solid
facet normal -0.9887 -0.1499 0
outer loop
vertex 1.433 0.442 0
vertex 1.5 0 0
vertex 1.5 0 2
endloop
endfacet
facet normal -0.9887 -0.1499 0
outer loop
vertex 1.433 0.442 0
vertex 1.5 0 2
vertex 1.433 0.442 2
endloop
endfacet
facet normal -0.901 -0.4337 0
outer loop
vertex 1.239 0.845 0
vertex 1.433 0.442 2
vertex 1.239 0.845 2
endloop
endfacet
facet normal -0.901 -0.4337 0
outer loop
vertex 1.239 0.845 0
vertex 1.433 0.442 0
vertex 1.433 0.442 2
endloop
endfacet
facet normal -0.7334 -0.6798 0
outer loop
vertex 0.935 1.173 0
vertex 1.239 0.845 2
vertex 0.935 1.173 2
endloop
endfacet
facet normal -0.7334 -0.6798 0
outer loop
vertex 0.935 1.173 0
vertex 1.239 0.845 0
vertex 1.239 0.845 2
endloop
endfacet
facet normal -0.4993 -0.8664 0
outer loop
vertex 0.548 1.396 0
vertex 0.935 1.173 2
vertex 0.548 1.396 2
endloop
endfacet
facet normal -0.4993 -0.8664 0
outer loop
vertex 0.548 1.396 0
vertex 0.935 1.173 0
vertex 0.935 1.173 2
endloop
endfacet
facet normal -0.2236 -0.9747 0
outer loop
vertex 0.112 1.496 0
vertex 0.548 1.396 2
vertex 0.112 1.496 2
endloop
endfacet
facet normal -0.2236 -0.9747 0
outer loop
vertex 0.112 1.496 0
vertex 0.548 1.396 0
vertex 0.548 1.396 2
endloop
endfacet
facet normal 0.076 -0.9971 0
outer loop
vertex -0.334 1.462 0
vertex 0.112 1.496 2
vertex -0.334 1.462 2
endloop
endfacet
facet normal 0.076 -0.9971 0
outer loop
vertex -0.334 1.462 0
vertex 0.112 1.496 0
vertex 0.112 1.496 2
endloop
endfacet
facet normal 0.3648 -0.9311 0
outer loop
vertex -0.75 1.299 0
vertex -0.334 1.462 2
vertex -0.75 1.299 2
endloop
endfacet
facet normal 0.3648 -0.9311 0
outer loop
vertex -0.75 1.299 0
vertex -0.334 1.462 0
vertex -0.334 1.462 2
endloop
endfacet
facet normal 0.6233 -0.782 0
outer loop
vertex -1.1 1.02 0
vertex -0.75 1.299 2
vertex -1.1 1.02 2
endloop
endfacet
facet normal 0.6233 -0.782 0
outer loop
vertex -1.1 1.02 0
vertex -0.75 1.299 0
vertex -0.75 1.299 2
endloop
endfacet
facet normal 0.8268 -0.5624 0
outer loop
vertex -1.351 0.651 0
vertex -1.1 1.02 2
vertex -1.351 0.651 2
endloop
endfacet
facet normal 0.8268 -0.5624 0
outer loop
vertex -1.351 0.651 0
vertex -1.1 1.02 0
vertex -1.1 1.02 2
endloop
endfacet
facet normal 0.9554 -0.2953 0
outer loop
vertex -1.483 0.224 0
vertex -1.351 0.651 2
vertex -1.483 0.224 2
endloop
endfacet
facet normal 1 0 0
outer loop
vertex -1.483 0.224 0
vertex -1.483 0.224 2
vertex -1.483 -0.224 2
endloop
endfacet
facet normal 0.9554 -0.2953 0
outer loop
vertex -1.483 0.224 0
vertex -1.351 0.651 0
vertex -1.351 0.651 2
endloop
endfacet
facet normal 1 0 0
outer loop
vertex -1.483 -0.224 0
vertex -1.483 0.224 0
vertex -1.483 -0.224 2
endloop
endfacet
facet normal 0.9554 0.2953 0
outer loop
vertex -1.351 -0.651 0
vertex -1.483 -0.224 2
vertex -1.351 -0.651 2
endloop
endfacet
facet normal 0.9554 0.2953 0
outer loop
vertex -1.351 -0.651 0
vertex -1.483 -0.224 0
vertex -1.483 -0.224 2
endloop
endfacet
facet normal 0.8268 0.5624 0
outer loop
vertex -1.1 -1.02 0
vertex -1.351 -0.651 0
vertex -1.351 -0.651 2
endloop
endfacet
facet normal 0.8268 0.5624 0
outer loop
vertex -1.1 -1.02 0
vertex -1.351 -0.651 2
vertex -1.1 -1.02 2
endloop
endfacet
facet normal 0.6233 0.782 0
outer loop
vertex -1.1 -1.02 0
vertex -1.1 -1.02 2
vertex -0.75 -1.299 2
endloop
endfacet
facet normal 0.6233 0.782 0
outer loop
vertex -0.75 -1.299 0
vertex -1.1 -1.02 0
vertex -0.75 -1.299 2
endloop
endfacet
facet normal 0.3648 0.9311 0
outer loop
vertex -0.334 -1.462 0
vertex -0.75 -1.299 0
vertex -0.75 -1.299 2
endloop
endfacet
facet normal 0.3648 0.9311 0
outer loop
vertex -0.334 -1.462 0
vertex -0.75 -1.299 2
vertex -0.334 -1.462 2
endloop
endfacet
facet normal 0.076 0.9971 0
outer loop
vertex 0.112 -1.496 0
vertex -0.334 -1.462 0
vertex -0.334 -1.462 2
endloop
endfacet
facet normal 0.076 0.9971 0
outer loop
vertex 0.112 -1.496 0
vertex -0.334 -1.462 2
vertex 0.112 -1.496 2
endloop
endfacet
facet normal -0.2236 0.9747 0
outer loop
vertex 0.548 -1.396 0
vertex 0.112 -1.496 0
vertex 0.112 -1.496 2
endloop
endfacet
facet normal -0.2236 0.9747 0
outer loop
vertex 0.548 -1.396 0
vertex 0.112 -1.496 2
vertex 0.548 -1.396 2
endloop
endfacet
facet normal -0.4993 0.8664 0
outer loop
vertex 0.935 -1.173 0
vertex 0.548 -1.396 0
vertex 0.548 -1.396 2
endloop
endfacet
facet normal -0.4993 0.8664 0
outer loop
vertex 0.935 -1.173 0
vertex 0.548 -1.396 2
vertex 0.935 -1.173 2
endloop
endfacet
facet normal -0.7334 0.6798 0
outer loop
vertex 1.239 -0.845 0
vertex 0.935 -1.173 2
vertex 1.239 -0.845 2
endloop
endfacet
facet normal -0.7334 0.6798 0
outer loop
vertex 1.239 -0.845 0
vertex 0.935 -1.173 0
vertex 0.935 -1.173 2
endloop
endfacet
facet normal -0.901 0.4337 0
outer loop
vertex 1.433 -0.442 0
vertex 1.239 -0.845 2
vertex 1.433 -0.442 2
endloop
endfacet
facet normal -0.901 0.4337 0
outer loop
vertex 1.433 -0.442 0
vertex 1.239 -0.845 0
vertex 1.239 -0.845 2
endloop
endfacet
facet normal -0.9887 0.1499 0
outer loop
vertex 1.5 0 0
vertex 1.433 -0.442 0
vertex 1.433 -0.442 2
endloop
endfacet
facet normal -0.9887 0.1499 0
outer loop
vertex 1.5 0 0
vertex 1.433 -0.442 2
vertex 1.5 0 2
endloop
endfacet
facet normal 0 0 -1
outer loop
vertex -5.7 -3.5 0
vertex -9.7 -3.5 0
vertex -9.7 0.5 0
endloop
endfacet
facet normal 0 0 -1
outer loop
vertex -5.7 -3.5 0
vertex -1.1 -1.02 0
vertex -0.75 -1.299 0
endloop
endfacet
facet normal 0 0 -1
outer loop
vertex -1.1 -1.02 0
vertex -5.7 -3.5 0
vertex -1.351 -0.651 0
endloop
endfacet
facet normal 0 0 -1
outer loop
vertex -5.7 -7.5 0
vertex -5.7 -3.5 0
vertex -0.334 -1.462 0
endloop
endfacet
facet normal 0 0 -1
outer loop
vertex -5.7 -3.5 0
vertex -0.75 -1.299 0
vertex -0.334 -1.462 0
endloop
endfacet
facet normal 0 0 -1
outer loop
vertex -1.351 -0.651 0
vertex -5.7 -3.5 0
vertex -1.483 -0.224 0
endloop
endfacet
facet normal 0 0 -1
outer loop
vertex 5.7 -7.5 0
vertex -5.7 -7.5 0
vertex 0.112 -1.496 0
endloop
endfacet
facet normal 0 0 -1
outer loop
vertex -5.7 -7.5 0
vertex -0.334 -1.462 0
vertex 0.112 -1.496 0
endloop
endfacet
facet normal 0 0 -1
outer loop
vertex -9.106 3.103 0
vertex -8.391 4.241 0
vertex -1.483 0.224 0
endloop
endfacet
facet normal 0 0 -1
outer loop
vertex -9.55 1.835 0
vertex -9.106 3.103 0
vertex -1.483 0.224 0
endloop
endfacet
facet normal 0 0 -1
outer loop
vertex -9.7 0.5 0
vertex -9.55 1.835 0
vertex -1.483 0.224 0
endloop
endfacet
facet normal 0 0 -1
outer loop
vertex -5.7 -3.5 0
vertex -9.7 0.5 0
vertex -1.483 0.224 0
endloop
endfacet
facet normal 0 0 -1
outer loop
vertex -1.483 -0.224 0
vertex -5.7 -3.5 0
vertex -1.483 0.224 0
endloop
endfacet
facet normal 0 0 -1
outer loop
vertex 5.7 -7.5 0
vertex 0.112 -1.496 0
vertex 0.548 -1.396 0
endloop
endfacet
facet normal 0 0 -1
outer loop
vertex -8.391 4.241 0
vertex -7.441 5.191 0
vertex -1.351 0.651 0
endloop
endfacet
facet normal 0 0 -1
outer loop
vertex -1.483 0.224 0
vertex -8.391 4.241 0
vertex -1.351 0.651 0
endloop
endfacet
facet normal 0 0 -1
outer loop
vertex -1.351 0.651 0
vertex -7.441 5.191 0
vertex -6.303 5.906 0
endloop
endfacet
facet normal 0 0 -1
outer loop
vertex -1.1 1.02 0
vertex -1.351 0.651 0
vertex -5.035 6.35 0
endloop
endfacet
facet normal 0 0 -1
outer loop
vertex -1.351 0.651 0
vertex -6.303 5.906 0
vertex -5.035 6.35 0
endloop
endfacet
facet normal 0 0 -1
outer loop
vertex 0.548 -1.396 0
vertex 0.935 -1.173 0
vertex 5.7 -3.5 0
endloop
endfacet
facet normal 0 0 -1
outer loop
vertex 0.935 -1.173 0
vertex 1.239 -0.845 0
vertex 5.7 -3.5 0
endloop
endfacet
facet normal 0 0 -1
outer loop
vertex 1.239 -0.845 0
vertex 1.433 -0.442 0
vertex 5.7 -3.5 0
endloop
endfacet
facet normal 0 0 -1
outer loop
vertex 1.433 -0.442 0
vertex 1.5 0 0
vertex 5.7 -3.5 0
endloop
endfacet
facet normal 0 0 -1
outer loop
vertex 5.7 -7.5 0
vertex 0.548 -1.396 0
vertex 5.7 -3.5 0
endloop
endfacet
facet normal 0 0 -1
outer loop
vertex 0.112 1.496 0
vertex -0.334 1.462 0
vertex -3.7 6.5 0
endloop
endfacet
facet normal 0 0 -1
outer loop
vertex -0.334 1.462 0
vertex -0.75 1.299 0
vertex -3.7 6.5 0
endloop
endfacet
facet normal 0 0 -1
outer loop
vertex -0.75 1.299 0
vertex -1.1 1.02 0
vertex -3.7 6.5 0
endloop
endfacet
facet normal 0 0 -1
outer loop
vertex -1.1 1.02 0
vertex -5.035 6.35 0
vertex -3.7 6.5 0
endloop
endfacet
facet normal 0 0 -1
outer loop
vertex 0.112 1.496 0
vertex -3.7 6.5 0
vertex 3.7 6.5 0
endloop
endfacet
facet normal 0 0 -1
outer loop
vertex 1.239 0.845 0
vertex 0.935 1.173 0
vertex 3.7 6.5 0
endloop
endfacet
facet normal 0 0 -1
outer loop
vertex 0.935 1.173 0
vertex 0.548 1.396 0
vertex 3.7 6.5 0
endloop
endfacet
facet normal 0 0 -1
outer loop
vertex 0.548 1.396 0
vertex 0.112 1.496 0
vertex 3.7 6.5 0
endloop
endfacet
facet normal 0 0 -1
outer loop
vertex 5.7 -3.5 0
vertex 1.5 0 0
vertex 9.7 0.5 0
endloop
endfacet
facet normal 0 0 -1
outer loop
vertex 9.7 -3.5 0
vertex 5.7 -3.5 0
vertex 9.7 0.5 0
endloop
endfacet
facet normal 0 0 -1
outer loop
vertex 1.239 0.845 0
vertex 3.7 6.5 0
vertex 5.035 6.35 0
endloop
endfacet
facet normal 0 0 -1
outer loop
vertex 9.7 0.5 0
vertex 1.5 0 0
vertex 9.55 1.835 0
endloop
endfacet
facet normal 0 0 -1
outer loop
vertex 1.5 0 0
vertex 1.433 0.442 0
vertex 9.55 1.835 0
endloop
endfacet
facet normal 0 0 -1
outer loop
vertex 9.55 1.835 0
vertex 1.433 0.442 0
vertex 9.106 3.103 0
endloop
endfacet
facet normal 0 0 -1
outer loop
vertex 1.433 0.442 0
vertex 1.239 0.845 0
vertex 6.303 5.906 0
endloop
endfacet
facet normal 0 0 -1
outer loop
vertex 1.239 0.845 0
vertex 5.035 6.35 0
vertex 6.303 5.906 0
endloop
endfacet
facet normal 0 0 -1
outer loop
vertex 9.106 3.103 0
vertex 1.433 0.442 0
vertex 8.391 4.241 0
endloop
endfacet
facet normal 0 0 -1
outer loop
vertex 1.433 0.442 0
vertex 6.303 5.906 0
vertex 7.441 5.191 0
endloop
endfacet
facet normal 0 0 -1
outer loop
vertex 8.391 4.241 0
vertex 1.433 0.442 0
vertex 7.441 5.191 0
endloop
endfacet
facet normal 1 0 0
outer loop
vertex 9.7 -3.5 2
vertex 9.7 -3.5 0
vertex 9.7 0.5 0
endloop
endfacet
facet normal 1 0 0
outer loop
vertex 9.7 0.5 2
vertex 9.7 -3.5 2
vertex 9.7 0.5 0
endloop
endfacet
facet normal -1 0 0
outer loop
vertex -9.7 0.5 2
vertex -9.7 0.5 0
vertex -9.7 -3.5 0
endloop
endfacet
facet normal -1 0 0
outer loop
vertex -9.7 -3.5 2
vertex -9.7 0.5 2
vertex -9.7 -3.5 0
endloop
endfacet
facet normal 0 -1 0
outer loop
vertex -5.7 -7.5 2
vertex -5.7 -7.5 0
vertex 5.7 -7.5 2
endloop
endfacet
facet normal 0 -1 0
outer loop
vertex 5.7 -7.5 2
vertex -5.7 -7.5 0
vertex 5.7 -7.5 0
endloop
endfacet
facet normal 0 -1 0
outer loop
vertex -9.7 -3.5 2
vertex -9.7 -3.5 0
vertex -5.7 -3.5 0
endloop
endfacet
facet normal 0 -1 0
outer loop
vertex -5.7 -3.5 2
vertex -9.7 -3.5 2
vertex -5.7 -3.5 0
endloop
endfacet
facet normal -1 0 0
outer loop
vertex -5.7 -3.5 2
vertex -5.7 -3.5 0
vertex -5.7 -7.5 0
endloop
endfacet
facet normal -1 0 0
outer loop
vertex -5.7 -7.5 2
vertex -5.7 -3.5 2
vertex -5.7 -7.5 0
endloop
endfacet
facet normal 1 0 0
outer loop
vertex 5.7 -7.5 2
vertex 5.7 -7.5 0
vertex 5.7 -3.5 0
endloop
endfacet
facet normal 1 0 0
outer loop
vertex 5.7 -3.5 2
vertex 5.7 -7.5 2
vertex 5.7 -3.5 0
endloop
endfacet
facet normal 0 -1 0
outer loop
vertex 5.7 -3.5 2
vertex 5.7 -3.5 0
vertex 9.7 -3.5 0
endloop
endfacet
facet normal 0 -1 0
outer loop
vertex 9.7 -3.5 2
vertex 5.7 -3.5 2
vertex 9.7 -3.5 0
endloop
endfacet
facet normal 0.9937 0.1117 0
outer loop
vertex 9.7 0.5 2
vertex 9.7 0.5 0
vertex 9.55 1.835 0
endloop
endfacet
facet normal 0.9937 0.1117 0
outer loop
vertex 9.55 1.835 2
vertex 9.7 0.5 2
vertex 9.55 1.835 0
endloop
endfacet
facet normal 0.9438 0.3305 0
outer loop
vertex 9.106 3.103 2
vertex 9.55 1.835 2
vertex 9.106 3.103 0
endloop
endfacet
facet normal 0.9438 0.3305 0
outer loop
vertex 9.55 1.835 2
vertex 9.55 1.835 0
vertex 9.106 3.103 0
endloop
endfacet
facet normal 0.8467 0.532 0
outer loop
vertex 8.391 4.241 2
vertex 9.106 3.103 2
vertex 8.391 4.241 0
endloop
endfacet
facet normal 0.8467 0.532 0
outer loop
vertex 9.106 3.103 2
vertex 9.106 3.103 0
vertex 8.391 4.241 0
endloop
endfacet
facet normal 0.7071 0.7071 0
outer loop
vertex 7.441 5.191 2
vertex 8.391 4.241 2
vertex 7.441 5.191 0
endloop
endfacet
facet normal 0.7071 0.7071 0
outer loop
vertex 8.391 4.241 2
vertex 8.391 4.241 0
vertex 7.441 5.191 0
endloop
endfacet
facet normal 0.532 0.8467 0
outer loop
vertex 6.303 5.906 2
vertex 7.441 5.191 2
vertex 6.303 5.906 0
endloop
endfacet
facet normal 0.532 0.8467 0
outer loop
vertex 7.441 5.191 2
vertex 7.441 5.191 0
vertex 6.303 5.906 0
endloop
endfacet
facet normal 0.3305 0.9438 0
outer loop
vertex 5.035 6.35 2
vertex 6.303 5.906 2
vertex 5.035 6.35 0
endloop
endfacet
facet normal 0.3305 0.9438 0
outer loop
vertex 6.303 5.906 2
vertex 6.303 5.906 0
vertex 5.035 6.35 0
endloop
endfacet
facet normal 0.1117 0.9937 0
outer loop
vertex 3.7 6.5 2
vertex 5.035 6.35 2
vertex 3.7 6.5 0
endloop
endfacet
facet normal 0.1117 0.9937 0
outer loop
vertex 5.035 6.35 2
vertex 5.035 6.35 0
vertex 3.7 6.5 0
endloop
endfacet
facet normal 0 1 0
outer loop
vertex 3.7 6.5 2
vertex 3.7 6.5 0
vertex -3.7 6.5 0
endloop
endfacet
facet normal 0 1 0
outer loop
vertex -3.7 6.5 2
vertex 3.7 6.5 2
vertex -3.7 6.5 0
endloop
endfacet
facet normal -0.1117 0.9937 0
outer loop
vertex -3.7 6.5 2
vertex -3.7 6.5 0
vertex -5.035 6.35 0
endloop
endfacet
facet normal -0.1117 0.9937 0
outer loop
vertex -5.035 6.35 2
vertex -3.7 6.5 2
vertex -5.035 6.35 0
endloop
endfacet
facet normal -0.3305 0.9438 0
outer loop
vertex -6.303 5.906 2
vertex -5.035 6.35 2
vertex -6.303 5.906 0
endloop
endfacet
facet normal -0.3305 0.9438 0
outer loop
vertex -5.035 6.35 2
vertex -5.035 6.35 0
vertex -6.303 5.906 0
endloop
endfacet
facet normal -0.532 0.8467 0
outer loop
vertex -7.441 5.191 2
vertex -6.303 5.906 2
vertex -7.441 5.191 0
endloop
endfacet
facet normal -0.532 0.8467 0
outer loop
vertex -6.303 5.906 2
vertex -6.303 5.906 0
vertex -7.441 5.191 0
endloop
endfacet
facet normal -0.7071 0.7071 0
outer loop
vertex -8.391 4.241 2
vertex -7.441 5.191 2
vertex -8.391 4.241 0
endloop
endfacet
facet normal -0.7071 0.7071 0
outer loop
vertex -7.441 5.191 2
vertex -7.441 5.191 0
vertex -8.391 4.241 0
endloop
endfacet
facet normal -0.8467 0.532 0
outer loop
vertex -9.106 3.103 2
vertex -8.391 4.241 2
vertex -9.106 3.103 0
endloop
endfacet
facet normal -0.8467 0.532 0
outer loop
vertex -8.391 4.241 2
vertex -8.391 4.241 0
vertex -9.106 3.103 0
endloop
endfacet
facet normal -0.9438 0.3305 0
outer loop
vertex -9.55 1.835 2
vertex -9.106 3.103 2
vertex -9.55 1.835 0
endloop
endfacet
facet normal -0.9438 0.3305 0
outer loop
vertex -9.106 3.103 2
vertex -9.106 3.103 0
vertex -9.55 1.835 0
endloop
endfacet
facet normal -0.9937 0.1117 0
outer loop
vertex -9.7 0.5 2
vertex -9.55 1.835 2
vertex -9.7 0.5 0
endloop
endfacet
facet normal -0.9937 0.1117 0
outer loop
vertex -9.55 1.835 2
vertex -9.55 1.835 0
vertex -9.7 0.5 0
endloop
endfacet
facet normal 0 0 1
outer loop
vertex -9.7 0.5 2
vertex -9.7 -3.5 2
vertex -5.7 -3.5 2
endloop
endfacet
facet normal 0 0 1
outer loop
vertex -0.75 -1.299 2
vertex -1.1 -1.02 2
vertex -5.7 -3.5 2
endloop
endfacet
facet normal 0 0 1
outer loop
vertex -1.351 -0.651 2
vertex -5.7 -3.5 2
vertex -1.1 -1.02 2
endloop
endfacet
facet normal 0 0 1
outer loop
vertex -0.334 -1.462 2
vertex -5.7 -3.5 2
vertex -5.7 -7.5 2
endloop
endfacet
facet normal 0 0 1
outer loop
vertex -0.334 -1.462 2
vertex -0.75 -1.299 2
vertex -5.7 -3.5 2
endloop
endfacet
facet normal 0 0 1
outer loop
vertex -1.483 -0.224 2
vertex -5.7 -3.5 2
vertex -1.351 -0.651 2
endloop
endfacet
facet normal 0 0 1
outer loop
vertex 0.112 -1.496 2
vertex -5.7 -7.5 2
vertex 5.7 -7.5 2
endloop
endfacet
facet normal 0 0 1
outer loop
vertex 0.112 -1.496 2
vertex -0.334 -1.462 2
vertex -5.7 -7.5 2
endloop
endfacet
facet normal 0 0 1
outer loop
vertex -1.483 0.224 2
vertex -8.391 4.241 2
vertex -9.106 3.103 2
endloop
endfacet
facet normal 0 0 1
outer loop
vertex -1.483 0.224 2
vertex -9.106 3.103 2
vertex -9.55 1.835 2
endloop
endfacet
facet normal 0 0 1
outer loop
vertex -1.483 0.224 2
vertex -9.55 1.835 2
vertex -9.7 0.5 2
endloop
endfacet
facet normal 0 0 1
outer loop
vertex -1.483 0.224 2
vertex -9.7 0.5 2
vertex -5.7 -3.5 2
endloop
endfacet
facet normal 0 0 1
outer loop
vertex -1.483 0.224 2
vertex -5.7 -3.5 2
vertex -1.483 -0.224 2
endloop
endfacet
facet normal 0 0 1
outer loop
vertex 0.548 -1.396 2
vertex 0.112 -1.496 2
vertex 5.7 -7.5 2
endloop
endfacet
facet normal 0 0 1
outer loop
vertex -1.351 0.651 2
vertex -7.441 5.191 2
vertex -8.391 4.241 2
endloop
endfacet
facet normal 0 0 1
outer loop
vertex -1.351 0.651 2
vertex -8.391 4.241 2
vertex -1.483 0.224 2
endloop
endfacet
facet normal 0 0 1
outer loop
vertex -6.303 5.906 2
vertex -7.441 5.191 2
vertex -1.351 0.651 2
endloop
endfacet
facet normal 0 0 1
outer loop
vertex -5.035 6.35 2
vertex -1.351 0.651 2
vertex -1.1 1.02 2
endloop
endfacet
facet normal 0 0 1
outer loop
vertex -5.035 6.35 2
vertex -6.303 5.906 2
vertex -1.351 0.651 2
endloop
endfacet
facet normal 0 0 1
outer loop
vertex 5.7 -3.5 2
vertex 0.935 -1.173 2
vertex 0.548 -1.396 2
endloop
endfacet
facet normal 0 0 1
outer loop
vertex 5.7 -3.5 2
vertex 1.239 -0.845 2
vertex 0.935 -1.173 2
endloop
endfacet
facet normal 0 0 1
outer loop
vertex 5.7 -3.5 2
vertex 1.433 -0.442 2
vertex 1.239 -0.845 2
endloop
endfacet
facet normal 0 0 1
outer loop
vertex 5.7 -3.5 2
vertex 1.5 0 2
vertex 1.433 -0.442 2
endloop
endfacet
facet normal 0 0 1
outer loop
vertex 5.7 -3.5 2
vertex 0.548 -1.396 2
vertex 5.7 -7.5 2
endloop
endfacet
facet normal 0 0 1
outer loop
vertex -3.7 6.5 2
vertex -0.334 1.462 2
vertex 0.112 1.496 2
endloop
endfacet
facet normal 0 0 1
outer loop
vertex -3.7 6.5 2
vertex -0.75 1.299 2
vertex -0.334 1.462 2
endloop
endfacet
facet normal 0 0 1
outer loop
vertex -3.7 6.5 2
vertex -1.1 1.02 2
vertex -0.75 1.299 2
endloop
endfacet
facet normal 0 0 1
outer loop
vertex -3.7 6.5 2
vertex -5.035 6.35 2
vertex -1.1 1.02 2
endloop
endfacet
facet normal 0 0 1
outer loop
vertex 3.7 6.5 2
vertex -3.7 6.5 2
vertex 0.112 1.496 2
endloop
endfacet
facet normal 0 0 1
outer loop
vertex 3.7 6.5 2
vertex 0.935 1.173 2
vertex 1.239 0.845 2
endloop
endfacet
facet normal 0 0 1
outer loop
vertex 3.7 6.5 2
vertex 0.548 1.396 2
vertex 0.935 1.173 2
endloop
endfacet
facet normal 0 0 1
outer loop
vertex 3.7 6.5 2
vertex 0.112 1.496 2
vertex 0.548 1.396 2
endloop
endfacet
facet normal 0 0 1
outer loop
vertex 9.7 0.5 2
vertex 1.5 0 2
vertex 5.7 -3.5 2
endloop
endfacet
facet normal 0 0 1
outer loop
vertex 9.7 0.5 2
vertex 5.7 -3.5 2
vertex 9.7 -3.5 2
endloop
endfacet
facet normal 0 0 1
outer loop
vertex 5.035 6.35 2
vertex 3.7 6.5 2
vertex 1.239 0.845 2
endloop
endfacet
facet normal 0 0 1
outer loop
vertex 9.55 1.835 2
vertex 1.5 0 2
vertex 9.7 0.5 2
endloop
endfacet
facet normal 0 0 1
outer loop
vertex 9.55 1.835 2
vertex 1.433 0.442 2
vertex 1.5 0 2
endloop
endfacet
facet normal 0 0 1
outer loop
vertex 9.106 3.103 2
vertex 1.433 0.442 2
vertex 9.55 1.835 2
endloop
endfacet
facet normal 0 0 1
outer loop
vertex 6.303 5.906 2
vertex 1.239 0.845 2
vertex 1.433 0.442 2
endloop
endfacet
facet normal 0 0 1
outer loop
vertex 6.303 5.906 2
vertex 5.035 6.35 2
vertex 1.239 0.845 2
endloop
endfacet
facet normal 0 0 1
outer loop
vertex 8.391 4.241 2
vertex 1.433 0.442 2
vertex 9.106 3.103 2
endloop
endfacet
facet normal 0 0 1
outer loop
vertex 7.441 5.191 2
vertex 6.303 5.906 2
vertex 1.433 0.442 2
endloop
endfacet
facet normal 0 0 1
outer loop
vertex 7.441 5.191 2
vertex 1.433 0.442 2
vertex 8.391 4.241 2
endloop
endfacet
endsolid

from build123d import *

# Parameters (mm, degrees)
MODEL_R             = 1.5
BOSS_EXTRUDE1_DEPTH = 2


with BuildPart() as part:
    # Model → Boss-Extrude1 (new body)
    with BuildSketch(Plane.XY):
        with BuildLine():
            Line((9.7, -3.5), (9.7, 0.5))
            ThreePointArc((9.7, 0.5), (7.942640687, 4.742640687), (3.7, 6.5))
            Line((3.7, 6.5), (-3.7, 6.5))
            ThreePointArc((-3.7, 6.5), (-7.942640687, 4.742640687), (-9.7, 0.5))
            Line((-9.7, 0.5), (-9.7, -3.5))
            Line((-9.7, -3.5), (-5.7, -3.5))
            Line((-5.7, -3.5), (-5.7, -7.5))
            Line((-5.7, -7.5), (5.7, -7.5))
            Line((5.7, -7.5), (5.7, -3.5))
            Line((5.7, -3.5), (9.7, -3.5))
        make_face()
        Circle(MODEL_R, mode=Mode.SUBTRACT)
    extrude(amount=BOSS_EXTRUDE1_DEPTH)


solid = part.part
